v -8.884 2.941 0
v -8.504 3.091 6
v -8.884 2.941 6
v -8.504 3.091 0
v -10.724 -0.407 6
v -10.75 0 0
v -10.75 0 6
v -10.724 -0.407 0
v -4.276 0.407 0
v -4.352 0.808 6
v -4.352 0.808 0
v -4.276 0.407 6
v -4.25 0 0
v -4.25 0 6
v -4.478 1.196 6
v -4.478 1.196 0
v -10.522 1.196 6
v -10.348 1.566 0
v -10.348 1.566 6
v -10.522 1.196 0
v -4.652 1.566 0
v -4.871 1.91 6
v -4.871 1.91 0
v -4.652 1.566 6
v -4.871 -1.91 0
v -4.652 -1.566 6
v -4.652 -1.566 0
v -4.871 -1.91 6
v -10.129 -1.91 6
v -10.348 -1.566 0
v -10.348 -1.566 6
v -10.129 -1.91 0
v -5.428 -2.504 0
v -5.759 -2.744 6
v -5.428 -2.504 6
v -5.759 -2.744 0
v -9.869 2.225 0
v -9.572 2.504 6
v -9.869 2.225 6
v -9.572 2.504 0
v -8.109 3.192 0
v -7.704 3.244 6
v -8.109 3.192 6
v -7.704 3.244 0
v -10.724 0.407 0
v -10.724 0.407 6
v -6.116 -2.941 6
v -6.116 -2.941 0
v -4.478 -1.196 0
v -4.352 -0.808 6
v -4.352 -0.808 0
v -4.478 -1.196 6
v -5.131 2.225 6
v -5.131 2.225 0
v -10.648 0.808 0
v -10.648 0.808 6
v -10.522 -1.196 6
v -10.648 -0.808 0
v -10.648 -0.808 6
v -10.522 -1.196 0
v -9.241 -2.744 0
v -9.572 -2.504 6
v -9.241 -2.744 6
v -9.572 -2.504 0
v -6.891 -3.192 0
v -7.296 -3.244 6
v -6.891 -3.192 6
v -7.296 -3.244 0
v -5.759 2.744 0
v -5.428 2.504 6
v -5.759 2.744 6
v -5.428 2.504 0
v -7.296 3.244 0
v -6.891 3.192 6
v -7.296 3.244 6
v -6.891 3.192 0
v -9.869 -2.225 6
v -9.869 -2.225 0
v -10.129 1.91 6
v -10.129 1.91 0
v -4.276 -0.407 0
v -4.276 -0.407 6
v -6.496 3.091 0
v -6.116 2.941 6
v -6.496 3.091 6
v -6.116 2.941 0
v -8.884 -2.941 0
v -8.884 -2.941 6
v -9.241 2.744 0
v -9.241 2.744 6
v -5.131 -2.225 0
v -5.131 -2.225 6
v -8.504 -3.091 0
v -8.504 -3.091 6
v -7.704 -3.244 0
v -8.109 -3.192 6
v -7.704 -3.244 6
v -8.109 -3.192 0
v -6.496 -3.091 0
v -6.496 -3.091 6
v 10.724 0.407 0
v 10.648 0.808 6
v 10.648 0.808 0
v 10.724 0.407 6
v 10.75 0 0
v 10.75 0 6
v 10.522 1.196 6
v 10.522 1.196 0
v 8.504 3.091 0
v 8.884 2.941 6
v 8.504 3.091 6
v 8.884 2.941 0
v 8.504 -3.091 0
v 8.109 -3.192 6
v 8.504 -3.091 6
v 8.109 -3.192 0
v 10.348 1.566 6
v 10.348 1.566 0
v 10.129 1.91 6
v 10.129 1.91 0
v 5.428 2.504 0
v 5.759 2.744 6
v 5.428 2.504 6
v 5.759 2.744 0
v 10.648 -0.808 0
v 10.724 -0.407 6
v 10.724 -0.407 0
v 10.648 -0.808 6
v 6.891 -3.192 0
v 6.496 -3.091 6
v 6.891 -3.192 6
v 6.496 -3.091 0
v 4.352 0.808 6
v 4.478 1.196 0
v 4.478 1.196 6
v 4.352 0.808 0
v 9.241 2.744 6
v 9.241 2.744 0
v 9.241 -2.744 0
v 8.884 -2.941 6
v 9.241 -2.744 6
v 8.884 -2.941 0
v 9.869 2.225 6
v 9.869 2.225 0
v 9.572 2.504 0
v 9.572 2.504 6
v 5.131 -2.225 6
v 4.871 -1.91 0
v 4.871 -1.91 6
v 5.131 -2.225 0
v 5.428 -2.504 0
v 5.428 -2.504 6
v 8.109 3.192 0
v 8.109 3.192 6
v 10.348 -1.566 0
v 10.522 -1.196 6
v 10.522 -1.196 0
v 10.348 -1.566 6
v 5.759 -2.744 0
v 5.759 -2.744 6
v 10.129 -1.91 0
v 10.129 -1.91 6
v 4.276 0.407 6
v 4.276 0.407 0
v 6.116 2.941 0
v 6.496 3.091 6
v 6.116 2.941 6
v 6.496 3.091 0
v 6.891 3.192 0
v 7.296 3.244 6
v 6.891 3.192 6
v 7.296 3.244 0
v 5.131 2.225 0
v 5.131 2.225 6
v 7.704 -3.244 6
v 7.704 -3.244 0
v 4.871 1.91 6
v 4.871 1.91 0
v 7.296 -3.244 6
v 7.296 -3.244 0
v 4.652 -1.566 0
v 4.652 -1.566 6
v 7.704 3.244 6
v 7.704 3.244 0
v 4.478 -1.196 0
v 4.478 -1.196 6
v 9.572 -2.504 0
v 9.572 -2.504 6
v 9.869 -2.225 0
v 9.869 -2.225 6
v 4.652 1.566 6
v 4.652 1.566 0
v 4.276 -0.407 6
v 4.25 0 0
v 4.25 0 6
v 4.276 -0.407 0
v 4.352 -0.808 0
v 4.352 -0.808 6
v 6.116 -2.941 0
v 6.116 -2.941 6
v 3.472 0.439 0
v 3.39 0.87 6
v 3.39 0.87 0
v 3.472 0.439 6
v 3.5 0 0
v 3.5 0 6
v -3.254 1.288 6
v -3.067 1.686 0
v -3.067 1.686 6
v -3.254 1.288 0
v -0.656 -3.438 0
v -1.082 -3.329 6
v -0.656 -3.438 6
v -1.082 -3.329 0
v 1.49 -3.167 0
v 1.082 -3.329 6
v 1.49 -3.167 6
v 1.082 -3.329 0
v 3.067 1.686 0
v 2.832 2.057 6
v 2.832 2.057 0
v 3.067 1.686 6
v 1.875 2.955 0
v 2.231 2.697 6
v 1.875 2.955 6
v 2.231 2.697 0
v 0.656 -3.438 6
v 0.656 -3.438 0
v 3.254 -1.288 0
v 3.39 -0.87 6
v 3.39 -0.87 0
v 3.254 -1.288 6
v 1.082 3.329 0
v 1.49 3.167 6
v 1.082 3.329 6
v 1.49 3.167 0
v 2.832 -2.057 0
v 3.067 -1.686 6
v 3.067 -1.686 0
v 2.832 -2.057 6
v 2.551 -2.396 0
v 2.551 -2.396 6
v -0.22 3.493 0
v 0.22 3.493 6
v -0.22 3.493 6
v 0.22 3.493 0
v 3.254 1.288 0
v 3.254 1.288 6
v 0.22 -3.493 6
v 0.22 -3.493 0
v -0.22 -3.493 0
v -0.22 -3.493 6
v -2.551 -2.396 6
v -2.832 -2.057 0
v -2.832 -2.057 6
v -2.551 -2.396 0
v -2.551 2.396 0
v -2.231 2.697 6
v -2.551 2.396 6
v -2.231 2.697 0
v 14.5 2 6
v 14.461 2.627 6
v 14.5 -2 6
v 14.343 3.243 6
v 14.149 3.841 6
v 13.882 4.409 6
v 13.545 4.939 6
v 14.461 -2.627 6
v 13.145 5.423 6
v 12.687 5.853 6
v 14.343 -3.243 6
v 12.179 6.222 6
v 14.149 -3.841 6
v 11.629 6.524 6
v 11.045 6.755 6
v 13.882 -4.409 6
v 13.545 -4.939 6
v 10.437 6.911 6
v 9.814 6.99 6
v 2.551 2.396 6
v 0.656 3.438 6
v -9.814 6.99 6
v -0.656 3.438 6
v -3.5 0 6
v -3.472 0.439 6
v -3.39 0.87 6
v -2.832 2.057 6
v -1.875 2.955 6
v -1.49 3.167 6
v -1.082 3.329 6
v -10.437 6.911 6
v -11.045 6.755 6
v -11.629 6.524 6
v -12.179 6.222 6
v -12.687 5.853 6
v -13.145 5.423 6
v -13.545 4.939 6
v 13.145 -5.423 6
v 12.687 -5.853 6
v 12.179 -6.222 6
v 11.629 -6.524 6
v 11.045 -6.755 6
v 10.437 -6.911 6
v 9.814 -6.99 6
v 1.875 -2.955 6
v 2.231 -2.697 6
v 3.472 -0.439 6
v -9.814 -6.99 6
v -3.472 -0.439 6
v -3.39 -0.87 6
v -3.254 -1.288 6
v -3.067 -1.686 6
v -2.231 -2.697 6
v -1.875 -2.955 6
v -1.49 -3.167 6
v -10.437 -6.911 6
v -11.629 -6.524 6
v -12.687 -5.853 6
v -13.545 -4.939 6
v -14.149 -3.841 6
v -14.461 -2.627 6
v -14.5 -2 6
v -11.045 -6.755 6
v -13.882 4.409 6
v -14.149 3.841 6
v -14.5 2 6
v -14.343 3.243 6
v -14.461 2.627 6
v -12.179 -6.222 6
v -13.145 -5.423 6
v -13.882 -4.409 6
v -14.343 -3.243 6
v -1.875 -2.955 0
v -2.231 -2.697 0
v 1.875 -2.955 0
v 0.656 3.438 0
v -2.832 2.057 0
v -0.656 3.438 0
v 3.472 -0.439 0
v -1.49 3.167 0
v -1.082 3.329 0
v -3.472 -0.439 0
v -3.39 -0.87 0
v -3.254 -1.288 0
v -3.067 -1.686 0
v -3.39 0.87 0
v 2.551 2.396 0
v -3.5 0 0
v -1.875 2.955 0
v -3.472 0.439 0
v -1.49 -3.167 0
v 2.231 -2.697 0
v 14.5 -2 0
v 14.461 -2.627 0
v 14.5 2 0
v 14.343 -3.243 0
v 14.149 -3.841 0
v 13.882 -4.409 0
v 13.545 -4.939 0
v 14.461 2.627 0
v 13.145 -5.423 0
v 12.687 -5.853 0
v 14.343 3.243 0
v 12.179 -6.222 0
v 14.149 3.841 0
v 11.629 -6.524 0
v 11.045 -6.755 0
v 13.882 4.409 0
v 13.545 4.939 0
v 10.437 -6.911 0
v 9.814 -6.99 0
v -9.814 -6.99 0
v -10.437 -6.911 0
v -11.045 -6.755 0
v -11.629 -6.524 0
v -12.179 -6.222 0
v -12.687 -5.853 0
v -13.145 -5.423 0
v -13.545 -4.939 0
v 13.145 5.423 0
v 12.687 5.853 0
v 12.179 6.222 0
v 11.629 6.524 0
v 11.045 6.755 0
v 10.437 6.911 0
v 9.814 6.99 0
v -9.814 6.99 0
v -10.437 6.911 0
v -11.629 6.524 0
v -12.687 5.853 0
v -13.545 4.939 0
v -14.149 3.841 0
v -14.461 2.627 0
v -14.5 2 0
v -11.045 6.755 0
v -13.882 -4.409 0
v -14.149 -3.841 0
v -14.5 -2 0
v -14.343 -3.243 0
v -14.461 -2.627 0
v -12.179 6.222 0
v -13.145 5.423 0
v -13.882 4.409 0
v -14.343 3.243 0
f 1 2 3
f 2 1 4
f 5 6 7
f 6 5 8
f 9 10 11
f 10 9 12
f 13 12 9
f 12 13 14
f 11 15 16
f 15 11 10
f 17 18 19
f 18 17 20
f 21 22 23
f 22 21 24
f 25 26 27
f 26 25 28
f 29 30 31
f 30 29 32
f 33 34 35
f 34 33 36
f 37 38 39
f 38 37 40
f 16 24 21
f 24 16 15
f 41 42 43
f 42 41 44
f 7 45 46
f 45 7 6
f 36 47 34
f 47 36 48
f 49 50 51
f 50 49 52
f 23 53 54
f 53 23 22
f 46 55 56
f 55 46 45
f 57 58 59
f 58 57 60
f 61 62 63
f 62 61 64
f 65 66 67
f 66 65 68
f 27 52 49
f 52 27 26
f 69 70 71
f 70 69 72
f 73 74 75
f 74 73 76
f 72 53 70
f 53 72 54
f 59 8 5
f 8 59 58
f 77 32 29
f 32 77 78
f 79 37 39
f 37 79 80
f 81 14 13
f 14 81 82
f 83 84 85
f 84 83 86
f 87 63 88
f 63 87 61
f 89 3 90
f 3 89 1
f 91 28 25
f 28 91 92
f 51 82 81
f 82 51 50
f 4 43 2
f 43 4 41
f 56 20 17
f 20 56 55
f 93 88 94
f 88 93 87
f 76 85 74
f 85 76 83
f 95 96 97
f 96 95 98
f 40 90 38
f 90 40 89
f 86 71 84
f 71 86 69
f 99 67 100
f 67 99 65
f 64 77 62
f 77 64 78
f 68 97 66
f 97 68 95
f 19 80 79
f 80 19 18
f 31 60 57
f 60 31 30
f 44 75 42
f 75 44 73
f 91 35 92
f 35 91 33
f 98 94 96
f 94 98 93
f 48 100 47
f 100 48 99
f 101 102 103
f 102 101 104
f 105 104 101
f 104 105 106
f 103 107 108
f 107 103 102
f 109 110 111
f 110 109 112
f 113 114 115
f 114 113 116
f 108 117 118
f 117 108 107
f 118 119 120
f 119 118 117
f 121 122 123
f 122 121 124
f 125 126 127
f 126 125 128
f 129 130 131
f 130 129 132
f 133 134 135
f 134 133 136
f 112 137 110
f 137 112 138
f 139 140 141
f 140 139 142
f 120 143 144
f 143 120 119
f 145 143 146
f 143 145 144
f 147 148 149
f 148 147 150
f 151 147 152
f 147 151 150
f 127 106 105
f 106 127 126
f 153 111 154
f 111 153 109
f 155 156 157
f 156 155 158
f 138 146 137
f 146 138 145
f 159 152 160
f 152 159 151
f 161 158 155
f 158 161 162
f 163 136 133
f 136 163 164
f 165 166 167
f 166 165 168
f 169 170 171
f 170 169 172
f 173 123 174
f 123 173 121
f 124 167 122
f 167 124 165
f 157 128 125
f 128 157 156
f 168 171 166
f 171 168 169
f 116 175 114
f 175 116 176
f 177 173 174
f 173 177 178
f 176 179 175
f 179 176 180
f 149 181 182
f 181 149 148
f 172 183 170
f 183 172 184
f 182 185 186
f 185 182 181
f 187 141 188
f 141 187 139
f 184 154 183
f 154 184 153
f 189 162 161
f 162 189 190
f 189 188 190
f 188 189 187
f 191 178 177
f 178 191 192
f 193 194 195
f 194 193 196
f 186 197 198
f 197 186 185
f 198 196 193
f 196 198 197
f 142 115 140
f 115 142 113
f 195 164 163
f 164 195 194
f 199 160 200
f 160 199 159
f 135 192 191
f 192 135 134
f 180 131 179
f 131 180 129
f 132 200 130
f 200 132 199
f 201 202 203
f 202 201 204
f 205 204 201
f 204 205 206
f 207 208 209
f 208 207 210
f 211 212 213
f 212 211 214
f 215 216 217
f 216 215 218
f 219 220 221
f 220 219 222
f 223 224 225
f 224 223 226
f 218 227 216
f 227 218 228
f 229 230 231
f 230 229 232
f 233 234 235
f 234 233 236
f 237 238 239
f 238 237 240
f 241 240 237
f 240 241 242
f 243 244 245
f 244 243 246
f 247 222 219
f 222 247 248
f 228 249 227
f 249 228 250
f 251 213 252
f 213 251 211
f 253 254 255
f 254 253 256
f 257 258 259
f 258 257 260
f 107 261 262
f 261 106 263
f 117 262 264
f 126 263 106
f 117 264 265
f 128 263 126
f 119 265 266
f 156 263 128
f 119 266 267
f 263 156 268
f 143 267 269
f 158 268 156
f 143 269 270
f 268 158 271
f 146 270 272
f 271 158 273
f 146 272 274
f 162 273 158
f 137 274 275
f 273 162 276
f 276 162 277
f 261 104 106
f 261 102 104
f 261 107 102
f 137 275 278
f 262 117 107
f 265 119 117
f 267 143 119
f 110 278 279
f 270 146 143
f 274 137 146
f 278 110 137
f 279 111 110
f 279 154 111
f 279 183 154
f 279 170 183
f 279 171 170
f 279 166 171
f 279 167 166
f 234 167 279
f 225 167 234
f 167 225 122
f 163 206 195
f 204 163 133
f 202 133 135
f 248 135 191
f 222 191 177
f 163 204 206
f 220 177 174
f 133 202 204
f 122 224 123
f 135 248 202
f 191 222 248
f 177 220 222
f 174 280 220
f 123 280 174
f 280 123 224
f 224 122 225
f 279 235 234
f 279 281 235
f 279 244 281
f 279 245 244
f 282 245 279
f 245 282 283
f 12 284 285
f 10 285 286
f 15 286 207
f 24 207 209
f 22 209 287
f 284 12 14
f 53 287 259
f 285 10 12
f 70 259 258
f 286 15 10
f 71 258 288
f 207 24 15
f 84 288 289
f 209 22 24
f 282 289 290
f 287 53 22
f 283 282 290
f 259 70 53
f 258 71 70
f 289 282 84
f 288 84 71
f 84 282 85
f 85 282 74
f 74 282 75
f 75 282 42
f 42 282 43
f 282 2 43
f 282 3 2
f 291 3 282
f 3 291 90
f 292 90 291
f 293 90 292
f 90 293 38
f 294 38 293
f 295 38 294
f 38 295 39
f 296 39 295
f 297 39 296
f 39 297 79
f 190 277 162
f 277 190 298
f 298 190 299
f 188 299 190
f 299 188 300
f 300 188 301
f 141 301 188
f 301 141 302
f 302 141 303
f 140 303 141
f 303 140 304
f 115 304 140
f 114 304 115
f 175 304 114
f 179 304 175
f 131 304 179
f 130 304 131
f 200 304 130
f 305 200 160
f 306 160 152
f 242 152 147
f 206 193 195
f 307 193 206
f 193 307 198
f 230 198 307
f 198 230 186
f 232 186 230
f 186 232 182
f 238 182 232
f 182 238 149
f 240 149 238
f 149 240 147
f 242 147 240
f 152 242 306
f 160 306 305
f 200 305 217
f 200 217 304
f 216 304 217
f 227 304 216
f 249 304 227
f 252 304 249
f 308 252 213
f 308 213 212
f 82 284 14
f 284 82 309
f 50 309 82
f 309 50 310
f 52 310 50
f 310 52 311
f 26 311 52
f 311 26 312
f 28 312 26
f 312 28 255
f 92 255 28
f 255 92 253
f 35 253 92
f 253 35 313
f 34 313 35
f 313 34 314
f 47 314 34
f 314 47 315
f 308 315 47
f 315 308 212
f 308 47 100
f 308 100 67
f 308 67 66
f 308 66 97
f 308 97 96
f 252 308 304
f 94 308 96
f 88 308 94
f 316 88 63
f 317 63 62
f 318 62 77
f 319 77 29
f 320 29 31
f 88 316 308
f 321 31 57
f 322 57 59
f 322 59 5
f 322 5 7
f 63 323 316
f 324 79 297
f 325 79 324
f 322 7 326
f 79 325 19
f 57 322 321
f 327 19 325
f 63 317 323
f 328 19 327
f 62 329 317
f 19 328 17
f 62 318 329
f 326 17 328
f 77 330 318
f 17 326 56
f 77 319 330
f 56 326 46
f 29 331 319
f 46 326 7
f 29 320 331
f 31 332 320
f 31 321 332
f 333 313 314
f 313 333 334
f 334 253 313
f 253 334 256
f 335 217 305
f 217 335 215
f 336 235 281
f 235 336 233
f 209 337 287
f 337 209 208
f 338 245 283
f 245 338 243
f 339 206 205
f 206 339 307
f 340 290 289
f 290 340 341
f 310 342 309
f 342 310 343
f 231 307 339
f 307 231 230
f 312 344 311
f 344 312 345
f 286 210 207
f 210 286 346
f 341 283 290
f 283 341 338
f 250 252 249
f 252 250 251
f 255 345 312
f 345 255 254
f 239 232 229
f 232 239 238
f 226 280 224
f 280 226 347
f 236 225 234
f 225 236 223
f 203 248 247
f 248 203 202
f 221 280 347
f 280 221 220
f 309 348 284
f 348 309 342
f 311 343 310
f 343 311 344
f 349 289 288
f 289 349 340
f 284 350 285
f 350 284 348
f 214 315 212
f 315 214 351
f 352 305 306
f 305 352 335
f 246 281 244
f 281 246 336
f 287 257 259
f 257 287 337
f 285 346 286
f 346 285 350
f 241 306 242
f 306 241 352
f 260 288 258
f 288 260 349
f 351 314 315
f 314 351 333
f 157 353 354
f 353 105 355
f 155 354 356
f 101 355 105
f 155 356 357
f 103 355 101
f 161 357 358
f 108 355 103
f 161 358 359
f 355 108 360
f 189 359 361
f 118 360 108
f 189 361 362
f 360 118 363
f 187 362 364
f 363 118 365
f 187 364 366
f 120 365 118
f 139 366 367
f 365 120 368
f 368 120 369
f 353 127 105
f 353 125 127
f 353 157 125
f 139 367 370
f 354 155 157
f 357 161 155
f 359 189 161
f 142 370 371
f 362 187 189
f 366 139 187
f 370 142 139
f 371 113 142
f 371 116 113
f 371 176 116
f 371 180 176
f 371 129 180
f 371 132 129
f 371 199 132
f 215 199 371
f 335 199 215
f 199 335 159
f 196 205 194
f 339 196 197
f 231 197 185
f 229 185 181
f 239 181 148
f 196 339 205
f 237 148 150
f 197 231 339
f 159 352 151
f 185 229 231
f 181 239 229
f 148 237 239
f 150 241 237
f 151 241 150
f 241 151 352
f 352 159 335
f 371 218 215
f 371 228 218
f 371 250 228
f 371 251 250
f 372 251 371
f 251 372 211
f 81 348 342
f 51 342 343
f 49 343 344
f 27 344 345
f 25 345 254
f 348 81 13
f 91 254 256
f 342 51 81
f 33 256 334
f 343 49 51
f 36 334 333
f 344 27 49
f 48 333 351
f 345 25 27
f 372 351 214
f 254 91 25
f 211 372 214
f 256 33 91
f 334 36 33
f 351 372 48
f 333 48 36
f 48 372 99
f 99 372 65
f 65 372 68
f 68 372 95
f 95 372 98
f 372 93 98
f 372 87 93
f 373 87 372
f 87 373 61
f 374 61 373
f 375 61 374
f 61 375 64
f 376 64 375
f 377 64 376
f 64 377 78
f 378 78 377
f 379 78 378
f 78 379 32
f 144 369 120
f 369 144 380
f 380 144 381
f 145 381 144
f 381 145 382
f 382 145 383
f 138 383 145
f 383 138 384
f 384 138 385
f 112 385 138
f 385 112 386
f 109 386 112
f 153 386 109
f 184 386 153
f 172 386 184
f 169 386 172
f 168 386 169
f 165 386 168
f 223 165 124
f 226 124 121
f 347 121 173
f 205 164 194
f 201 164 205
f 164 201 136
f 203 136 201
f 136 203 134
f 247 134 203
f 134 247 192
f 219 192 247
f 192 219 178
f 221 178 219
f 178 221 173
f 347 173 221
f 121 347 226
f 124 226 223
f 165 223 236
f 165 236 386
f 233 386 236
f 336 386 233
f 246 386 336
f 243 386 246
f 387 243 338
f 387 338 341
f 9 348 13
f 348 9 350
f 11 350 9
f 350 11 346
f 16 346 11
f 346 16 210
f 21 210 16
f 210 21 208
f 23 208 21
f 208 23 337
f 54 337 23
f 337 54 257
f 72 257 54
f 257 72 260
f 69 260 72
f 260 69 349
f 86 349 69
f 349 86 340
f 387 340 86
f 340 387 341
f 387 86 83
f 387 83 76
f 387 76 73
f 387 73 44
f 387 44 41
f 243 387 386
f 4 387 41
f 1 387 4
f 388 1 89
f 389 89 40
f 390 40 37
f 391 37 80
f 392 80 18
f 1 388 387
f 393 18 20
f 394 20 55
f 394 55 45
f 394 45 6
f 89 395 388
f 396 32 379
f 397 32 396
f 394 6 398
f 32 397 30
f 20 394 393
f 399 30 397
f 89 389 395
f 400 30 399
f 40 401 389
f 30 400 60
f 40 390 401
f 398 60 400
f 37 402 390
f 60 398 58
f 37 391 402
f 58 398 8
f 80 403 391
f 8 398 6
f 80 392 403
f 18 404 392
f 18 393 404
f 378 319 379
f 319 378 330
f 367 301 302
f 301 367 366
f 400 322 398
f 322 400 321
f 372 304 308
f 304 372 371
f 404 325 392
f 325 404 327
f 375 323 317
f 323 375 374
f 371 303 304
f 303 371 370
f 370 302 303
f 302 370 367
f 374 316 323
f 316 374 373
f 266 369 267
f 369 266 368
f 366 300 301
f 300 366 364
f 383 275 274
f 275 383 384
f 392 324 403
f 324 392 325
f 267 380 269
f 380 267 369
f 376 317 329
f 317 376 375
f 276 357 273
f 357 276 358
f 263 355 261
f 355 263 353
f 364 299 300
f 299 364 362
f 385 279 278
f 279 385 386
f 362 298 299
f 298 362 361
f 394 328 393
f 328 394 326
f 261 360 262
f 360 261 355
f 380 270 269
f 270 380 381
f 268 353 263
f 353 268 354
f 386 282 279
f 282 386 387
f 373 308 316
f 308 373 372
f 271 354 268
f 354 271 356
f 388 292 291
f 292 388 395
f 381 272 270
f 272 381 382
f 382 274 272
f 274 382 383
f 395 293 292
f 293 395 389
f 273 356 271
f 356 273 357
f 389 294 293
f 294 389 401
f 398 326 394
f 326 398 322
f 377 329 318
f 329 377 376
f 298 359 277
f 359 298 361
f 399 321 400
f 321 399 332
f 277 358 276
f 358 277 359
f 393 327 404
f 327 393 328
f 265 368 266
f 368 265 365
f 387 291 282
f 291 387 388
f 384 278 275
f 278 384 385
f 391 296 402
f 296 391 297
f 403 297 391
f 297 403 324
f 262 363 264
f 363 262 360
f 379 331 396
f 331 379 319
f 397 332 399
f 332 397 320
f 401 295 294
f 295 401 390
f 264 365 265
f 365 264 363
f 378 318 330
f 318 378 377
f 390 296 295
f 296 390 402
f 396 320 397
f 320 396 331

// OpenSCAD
$fn = 50;


difference() {
	union() {
		hull() {
			translate(v = [-9.5000000000, 2.0000000000, 0]) {
				cylinder(h = 6, r = 5);
			}
			translate(v = [9.5000000000, 2.0000000000, 0]) {
				cylinder(h = 6, r = 5);
			}
			translate(v = [-9.5000000000, -2.0000000000, 0]) {
				cylinder(h = 6, r = 5);
			}
			translate(v = [9.5000000000, -2.0000000000, 0]) {
				cylinder(h = 6, r = 5);
			}
		}
	}
	union() {
		#translate(v = [-7.5000000000, 0.0000000000, 0]) {
			cylinder(h = 6, r = 3.2500000000);
		}
		#translate(v = [7.5000000000, 0.0000000000, 0]) {
			cylinder(h = 6, r = 3.2500000000);
		}
		#translate(v = [-7.5000000000, 0.0000000000, -100.0000000000]) {
			cylinder(h = 200, r = 3.2500000000);
		}
		#translate(v = [-7.5000000000, 0.0000000000, -100.0000000000]) {
			cylinder(h = 200, r = 3.2500000000);
		}
		#translate(v = [7.5000000000, 0.0000000000, -100.0000000000]) {
			cylinder(h = 200, r = 3.2500000000);
		}
		#translate(v = [7.5000000000, 0.0000000000, -100.0000000000]) {
			cylinder(h = 200, r = 3.2500000000);
		}
		#translate(v = [-7.5000000000, 0.0000000000, 0]) {
			cylinder(h = 6, r = 1.8000000000);
		}
		#translate(v = [7.5000000000, 0.0000000000, 0]) {
			cylinder(h = 6, r = 1.8000000000);
		}
		#translate(v = [-7.5000000000, 0.0000000000, 0]) {
			cylinder(h = 6, r = 1.8000000000);
		}
		#translate(v = [7.5000000000, 0.0000000000, 0]) {
			cylinder(h = 6, r = 1.8000000000);
		}
		#translate(v = [-7.5000000000, 0.0000000000, 0]) {
			cylinder(h = 6, r = 1.8000000000);
		}
		#translate(v = [7.5000000000, 0.0000000000, 0]) {
			cylinder(h = 6, r = 1.8000000000);
		}
		#cylinder(h = 6, r = 3.5000000000);
	}
}
